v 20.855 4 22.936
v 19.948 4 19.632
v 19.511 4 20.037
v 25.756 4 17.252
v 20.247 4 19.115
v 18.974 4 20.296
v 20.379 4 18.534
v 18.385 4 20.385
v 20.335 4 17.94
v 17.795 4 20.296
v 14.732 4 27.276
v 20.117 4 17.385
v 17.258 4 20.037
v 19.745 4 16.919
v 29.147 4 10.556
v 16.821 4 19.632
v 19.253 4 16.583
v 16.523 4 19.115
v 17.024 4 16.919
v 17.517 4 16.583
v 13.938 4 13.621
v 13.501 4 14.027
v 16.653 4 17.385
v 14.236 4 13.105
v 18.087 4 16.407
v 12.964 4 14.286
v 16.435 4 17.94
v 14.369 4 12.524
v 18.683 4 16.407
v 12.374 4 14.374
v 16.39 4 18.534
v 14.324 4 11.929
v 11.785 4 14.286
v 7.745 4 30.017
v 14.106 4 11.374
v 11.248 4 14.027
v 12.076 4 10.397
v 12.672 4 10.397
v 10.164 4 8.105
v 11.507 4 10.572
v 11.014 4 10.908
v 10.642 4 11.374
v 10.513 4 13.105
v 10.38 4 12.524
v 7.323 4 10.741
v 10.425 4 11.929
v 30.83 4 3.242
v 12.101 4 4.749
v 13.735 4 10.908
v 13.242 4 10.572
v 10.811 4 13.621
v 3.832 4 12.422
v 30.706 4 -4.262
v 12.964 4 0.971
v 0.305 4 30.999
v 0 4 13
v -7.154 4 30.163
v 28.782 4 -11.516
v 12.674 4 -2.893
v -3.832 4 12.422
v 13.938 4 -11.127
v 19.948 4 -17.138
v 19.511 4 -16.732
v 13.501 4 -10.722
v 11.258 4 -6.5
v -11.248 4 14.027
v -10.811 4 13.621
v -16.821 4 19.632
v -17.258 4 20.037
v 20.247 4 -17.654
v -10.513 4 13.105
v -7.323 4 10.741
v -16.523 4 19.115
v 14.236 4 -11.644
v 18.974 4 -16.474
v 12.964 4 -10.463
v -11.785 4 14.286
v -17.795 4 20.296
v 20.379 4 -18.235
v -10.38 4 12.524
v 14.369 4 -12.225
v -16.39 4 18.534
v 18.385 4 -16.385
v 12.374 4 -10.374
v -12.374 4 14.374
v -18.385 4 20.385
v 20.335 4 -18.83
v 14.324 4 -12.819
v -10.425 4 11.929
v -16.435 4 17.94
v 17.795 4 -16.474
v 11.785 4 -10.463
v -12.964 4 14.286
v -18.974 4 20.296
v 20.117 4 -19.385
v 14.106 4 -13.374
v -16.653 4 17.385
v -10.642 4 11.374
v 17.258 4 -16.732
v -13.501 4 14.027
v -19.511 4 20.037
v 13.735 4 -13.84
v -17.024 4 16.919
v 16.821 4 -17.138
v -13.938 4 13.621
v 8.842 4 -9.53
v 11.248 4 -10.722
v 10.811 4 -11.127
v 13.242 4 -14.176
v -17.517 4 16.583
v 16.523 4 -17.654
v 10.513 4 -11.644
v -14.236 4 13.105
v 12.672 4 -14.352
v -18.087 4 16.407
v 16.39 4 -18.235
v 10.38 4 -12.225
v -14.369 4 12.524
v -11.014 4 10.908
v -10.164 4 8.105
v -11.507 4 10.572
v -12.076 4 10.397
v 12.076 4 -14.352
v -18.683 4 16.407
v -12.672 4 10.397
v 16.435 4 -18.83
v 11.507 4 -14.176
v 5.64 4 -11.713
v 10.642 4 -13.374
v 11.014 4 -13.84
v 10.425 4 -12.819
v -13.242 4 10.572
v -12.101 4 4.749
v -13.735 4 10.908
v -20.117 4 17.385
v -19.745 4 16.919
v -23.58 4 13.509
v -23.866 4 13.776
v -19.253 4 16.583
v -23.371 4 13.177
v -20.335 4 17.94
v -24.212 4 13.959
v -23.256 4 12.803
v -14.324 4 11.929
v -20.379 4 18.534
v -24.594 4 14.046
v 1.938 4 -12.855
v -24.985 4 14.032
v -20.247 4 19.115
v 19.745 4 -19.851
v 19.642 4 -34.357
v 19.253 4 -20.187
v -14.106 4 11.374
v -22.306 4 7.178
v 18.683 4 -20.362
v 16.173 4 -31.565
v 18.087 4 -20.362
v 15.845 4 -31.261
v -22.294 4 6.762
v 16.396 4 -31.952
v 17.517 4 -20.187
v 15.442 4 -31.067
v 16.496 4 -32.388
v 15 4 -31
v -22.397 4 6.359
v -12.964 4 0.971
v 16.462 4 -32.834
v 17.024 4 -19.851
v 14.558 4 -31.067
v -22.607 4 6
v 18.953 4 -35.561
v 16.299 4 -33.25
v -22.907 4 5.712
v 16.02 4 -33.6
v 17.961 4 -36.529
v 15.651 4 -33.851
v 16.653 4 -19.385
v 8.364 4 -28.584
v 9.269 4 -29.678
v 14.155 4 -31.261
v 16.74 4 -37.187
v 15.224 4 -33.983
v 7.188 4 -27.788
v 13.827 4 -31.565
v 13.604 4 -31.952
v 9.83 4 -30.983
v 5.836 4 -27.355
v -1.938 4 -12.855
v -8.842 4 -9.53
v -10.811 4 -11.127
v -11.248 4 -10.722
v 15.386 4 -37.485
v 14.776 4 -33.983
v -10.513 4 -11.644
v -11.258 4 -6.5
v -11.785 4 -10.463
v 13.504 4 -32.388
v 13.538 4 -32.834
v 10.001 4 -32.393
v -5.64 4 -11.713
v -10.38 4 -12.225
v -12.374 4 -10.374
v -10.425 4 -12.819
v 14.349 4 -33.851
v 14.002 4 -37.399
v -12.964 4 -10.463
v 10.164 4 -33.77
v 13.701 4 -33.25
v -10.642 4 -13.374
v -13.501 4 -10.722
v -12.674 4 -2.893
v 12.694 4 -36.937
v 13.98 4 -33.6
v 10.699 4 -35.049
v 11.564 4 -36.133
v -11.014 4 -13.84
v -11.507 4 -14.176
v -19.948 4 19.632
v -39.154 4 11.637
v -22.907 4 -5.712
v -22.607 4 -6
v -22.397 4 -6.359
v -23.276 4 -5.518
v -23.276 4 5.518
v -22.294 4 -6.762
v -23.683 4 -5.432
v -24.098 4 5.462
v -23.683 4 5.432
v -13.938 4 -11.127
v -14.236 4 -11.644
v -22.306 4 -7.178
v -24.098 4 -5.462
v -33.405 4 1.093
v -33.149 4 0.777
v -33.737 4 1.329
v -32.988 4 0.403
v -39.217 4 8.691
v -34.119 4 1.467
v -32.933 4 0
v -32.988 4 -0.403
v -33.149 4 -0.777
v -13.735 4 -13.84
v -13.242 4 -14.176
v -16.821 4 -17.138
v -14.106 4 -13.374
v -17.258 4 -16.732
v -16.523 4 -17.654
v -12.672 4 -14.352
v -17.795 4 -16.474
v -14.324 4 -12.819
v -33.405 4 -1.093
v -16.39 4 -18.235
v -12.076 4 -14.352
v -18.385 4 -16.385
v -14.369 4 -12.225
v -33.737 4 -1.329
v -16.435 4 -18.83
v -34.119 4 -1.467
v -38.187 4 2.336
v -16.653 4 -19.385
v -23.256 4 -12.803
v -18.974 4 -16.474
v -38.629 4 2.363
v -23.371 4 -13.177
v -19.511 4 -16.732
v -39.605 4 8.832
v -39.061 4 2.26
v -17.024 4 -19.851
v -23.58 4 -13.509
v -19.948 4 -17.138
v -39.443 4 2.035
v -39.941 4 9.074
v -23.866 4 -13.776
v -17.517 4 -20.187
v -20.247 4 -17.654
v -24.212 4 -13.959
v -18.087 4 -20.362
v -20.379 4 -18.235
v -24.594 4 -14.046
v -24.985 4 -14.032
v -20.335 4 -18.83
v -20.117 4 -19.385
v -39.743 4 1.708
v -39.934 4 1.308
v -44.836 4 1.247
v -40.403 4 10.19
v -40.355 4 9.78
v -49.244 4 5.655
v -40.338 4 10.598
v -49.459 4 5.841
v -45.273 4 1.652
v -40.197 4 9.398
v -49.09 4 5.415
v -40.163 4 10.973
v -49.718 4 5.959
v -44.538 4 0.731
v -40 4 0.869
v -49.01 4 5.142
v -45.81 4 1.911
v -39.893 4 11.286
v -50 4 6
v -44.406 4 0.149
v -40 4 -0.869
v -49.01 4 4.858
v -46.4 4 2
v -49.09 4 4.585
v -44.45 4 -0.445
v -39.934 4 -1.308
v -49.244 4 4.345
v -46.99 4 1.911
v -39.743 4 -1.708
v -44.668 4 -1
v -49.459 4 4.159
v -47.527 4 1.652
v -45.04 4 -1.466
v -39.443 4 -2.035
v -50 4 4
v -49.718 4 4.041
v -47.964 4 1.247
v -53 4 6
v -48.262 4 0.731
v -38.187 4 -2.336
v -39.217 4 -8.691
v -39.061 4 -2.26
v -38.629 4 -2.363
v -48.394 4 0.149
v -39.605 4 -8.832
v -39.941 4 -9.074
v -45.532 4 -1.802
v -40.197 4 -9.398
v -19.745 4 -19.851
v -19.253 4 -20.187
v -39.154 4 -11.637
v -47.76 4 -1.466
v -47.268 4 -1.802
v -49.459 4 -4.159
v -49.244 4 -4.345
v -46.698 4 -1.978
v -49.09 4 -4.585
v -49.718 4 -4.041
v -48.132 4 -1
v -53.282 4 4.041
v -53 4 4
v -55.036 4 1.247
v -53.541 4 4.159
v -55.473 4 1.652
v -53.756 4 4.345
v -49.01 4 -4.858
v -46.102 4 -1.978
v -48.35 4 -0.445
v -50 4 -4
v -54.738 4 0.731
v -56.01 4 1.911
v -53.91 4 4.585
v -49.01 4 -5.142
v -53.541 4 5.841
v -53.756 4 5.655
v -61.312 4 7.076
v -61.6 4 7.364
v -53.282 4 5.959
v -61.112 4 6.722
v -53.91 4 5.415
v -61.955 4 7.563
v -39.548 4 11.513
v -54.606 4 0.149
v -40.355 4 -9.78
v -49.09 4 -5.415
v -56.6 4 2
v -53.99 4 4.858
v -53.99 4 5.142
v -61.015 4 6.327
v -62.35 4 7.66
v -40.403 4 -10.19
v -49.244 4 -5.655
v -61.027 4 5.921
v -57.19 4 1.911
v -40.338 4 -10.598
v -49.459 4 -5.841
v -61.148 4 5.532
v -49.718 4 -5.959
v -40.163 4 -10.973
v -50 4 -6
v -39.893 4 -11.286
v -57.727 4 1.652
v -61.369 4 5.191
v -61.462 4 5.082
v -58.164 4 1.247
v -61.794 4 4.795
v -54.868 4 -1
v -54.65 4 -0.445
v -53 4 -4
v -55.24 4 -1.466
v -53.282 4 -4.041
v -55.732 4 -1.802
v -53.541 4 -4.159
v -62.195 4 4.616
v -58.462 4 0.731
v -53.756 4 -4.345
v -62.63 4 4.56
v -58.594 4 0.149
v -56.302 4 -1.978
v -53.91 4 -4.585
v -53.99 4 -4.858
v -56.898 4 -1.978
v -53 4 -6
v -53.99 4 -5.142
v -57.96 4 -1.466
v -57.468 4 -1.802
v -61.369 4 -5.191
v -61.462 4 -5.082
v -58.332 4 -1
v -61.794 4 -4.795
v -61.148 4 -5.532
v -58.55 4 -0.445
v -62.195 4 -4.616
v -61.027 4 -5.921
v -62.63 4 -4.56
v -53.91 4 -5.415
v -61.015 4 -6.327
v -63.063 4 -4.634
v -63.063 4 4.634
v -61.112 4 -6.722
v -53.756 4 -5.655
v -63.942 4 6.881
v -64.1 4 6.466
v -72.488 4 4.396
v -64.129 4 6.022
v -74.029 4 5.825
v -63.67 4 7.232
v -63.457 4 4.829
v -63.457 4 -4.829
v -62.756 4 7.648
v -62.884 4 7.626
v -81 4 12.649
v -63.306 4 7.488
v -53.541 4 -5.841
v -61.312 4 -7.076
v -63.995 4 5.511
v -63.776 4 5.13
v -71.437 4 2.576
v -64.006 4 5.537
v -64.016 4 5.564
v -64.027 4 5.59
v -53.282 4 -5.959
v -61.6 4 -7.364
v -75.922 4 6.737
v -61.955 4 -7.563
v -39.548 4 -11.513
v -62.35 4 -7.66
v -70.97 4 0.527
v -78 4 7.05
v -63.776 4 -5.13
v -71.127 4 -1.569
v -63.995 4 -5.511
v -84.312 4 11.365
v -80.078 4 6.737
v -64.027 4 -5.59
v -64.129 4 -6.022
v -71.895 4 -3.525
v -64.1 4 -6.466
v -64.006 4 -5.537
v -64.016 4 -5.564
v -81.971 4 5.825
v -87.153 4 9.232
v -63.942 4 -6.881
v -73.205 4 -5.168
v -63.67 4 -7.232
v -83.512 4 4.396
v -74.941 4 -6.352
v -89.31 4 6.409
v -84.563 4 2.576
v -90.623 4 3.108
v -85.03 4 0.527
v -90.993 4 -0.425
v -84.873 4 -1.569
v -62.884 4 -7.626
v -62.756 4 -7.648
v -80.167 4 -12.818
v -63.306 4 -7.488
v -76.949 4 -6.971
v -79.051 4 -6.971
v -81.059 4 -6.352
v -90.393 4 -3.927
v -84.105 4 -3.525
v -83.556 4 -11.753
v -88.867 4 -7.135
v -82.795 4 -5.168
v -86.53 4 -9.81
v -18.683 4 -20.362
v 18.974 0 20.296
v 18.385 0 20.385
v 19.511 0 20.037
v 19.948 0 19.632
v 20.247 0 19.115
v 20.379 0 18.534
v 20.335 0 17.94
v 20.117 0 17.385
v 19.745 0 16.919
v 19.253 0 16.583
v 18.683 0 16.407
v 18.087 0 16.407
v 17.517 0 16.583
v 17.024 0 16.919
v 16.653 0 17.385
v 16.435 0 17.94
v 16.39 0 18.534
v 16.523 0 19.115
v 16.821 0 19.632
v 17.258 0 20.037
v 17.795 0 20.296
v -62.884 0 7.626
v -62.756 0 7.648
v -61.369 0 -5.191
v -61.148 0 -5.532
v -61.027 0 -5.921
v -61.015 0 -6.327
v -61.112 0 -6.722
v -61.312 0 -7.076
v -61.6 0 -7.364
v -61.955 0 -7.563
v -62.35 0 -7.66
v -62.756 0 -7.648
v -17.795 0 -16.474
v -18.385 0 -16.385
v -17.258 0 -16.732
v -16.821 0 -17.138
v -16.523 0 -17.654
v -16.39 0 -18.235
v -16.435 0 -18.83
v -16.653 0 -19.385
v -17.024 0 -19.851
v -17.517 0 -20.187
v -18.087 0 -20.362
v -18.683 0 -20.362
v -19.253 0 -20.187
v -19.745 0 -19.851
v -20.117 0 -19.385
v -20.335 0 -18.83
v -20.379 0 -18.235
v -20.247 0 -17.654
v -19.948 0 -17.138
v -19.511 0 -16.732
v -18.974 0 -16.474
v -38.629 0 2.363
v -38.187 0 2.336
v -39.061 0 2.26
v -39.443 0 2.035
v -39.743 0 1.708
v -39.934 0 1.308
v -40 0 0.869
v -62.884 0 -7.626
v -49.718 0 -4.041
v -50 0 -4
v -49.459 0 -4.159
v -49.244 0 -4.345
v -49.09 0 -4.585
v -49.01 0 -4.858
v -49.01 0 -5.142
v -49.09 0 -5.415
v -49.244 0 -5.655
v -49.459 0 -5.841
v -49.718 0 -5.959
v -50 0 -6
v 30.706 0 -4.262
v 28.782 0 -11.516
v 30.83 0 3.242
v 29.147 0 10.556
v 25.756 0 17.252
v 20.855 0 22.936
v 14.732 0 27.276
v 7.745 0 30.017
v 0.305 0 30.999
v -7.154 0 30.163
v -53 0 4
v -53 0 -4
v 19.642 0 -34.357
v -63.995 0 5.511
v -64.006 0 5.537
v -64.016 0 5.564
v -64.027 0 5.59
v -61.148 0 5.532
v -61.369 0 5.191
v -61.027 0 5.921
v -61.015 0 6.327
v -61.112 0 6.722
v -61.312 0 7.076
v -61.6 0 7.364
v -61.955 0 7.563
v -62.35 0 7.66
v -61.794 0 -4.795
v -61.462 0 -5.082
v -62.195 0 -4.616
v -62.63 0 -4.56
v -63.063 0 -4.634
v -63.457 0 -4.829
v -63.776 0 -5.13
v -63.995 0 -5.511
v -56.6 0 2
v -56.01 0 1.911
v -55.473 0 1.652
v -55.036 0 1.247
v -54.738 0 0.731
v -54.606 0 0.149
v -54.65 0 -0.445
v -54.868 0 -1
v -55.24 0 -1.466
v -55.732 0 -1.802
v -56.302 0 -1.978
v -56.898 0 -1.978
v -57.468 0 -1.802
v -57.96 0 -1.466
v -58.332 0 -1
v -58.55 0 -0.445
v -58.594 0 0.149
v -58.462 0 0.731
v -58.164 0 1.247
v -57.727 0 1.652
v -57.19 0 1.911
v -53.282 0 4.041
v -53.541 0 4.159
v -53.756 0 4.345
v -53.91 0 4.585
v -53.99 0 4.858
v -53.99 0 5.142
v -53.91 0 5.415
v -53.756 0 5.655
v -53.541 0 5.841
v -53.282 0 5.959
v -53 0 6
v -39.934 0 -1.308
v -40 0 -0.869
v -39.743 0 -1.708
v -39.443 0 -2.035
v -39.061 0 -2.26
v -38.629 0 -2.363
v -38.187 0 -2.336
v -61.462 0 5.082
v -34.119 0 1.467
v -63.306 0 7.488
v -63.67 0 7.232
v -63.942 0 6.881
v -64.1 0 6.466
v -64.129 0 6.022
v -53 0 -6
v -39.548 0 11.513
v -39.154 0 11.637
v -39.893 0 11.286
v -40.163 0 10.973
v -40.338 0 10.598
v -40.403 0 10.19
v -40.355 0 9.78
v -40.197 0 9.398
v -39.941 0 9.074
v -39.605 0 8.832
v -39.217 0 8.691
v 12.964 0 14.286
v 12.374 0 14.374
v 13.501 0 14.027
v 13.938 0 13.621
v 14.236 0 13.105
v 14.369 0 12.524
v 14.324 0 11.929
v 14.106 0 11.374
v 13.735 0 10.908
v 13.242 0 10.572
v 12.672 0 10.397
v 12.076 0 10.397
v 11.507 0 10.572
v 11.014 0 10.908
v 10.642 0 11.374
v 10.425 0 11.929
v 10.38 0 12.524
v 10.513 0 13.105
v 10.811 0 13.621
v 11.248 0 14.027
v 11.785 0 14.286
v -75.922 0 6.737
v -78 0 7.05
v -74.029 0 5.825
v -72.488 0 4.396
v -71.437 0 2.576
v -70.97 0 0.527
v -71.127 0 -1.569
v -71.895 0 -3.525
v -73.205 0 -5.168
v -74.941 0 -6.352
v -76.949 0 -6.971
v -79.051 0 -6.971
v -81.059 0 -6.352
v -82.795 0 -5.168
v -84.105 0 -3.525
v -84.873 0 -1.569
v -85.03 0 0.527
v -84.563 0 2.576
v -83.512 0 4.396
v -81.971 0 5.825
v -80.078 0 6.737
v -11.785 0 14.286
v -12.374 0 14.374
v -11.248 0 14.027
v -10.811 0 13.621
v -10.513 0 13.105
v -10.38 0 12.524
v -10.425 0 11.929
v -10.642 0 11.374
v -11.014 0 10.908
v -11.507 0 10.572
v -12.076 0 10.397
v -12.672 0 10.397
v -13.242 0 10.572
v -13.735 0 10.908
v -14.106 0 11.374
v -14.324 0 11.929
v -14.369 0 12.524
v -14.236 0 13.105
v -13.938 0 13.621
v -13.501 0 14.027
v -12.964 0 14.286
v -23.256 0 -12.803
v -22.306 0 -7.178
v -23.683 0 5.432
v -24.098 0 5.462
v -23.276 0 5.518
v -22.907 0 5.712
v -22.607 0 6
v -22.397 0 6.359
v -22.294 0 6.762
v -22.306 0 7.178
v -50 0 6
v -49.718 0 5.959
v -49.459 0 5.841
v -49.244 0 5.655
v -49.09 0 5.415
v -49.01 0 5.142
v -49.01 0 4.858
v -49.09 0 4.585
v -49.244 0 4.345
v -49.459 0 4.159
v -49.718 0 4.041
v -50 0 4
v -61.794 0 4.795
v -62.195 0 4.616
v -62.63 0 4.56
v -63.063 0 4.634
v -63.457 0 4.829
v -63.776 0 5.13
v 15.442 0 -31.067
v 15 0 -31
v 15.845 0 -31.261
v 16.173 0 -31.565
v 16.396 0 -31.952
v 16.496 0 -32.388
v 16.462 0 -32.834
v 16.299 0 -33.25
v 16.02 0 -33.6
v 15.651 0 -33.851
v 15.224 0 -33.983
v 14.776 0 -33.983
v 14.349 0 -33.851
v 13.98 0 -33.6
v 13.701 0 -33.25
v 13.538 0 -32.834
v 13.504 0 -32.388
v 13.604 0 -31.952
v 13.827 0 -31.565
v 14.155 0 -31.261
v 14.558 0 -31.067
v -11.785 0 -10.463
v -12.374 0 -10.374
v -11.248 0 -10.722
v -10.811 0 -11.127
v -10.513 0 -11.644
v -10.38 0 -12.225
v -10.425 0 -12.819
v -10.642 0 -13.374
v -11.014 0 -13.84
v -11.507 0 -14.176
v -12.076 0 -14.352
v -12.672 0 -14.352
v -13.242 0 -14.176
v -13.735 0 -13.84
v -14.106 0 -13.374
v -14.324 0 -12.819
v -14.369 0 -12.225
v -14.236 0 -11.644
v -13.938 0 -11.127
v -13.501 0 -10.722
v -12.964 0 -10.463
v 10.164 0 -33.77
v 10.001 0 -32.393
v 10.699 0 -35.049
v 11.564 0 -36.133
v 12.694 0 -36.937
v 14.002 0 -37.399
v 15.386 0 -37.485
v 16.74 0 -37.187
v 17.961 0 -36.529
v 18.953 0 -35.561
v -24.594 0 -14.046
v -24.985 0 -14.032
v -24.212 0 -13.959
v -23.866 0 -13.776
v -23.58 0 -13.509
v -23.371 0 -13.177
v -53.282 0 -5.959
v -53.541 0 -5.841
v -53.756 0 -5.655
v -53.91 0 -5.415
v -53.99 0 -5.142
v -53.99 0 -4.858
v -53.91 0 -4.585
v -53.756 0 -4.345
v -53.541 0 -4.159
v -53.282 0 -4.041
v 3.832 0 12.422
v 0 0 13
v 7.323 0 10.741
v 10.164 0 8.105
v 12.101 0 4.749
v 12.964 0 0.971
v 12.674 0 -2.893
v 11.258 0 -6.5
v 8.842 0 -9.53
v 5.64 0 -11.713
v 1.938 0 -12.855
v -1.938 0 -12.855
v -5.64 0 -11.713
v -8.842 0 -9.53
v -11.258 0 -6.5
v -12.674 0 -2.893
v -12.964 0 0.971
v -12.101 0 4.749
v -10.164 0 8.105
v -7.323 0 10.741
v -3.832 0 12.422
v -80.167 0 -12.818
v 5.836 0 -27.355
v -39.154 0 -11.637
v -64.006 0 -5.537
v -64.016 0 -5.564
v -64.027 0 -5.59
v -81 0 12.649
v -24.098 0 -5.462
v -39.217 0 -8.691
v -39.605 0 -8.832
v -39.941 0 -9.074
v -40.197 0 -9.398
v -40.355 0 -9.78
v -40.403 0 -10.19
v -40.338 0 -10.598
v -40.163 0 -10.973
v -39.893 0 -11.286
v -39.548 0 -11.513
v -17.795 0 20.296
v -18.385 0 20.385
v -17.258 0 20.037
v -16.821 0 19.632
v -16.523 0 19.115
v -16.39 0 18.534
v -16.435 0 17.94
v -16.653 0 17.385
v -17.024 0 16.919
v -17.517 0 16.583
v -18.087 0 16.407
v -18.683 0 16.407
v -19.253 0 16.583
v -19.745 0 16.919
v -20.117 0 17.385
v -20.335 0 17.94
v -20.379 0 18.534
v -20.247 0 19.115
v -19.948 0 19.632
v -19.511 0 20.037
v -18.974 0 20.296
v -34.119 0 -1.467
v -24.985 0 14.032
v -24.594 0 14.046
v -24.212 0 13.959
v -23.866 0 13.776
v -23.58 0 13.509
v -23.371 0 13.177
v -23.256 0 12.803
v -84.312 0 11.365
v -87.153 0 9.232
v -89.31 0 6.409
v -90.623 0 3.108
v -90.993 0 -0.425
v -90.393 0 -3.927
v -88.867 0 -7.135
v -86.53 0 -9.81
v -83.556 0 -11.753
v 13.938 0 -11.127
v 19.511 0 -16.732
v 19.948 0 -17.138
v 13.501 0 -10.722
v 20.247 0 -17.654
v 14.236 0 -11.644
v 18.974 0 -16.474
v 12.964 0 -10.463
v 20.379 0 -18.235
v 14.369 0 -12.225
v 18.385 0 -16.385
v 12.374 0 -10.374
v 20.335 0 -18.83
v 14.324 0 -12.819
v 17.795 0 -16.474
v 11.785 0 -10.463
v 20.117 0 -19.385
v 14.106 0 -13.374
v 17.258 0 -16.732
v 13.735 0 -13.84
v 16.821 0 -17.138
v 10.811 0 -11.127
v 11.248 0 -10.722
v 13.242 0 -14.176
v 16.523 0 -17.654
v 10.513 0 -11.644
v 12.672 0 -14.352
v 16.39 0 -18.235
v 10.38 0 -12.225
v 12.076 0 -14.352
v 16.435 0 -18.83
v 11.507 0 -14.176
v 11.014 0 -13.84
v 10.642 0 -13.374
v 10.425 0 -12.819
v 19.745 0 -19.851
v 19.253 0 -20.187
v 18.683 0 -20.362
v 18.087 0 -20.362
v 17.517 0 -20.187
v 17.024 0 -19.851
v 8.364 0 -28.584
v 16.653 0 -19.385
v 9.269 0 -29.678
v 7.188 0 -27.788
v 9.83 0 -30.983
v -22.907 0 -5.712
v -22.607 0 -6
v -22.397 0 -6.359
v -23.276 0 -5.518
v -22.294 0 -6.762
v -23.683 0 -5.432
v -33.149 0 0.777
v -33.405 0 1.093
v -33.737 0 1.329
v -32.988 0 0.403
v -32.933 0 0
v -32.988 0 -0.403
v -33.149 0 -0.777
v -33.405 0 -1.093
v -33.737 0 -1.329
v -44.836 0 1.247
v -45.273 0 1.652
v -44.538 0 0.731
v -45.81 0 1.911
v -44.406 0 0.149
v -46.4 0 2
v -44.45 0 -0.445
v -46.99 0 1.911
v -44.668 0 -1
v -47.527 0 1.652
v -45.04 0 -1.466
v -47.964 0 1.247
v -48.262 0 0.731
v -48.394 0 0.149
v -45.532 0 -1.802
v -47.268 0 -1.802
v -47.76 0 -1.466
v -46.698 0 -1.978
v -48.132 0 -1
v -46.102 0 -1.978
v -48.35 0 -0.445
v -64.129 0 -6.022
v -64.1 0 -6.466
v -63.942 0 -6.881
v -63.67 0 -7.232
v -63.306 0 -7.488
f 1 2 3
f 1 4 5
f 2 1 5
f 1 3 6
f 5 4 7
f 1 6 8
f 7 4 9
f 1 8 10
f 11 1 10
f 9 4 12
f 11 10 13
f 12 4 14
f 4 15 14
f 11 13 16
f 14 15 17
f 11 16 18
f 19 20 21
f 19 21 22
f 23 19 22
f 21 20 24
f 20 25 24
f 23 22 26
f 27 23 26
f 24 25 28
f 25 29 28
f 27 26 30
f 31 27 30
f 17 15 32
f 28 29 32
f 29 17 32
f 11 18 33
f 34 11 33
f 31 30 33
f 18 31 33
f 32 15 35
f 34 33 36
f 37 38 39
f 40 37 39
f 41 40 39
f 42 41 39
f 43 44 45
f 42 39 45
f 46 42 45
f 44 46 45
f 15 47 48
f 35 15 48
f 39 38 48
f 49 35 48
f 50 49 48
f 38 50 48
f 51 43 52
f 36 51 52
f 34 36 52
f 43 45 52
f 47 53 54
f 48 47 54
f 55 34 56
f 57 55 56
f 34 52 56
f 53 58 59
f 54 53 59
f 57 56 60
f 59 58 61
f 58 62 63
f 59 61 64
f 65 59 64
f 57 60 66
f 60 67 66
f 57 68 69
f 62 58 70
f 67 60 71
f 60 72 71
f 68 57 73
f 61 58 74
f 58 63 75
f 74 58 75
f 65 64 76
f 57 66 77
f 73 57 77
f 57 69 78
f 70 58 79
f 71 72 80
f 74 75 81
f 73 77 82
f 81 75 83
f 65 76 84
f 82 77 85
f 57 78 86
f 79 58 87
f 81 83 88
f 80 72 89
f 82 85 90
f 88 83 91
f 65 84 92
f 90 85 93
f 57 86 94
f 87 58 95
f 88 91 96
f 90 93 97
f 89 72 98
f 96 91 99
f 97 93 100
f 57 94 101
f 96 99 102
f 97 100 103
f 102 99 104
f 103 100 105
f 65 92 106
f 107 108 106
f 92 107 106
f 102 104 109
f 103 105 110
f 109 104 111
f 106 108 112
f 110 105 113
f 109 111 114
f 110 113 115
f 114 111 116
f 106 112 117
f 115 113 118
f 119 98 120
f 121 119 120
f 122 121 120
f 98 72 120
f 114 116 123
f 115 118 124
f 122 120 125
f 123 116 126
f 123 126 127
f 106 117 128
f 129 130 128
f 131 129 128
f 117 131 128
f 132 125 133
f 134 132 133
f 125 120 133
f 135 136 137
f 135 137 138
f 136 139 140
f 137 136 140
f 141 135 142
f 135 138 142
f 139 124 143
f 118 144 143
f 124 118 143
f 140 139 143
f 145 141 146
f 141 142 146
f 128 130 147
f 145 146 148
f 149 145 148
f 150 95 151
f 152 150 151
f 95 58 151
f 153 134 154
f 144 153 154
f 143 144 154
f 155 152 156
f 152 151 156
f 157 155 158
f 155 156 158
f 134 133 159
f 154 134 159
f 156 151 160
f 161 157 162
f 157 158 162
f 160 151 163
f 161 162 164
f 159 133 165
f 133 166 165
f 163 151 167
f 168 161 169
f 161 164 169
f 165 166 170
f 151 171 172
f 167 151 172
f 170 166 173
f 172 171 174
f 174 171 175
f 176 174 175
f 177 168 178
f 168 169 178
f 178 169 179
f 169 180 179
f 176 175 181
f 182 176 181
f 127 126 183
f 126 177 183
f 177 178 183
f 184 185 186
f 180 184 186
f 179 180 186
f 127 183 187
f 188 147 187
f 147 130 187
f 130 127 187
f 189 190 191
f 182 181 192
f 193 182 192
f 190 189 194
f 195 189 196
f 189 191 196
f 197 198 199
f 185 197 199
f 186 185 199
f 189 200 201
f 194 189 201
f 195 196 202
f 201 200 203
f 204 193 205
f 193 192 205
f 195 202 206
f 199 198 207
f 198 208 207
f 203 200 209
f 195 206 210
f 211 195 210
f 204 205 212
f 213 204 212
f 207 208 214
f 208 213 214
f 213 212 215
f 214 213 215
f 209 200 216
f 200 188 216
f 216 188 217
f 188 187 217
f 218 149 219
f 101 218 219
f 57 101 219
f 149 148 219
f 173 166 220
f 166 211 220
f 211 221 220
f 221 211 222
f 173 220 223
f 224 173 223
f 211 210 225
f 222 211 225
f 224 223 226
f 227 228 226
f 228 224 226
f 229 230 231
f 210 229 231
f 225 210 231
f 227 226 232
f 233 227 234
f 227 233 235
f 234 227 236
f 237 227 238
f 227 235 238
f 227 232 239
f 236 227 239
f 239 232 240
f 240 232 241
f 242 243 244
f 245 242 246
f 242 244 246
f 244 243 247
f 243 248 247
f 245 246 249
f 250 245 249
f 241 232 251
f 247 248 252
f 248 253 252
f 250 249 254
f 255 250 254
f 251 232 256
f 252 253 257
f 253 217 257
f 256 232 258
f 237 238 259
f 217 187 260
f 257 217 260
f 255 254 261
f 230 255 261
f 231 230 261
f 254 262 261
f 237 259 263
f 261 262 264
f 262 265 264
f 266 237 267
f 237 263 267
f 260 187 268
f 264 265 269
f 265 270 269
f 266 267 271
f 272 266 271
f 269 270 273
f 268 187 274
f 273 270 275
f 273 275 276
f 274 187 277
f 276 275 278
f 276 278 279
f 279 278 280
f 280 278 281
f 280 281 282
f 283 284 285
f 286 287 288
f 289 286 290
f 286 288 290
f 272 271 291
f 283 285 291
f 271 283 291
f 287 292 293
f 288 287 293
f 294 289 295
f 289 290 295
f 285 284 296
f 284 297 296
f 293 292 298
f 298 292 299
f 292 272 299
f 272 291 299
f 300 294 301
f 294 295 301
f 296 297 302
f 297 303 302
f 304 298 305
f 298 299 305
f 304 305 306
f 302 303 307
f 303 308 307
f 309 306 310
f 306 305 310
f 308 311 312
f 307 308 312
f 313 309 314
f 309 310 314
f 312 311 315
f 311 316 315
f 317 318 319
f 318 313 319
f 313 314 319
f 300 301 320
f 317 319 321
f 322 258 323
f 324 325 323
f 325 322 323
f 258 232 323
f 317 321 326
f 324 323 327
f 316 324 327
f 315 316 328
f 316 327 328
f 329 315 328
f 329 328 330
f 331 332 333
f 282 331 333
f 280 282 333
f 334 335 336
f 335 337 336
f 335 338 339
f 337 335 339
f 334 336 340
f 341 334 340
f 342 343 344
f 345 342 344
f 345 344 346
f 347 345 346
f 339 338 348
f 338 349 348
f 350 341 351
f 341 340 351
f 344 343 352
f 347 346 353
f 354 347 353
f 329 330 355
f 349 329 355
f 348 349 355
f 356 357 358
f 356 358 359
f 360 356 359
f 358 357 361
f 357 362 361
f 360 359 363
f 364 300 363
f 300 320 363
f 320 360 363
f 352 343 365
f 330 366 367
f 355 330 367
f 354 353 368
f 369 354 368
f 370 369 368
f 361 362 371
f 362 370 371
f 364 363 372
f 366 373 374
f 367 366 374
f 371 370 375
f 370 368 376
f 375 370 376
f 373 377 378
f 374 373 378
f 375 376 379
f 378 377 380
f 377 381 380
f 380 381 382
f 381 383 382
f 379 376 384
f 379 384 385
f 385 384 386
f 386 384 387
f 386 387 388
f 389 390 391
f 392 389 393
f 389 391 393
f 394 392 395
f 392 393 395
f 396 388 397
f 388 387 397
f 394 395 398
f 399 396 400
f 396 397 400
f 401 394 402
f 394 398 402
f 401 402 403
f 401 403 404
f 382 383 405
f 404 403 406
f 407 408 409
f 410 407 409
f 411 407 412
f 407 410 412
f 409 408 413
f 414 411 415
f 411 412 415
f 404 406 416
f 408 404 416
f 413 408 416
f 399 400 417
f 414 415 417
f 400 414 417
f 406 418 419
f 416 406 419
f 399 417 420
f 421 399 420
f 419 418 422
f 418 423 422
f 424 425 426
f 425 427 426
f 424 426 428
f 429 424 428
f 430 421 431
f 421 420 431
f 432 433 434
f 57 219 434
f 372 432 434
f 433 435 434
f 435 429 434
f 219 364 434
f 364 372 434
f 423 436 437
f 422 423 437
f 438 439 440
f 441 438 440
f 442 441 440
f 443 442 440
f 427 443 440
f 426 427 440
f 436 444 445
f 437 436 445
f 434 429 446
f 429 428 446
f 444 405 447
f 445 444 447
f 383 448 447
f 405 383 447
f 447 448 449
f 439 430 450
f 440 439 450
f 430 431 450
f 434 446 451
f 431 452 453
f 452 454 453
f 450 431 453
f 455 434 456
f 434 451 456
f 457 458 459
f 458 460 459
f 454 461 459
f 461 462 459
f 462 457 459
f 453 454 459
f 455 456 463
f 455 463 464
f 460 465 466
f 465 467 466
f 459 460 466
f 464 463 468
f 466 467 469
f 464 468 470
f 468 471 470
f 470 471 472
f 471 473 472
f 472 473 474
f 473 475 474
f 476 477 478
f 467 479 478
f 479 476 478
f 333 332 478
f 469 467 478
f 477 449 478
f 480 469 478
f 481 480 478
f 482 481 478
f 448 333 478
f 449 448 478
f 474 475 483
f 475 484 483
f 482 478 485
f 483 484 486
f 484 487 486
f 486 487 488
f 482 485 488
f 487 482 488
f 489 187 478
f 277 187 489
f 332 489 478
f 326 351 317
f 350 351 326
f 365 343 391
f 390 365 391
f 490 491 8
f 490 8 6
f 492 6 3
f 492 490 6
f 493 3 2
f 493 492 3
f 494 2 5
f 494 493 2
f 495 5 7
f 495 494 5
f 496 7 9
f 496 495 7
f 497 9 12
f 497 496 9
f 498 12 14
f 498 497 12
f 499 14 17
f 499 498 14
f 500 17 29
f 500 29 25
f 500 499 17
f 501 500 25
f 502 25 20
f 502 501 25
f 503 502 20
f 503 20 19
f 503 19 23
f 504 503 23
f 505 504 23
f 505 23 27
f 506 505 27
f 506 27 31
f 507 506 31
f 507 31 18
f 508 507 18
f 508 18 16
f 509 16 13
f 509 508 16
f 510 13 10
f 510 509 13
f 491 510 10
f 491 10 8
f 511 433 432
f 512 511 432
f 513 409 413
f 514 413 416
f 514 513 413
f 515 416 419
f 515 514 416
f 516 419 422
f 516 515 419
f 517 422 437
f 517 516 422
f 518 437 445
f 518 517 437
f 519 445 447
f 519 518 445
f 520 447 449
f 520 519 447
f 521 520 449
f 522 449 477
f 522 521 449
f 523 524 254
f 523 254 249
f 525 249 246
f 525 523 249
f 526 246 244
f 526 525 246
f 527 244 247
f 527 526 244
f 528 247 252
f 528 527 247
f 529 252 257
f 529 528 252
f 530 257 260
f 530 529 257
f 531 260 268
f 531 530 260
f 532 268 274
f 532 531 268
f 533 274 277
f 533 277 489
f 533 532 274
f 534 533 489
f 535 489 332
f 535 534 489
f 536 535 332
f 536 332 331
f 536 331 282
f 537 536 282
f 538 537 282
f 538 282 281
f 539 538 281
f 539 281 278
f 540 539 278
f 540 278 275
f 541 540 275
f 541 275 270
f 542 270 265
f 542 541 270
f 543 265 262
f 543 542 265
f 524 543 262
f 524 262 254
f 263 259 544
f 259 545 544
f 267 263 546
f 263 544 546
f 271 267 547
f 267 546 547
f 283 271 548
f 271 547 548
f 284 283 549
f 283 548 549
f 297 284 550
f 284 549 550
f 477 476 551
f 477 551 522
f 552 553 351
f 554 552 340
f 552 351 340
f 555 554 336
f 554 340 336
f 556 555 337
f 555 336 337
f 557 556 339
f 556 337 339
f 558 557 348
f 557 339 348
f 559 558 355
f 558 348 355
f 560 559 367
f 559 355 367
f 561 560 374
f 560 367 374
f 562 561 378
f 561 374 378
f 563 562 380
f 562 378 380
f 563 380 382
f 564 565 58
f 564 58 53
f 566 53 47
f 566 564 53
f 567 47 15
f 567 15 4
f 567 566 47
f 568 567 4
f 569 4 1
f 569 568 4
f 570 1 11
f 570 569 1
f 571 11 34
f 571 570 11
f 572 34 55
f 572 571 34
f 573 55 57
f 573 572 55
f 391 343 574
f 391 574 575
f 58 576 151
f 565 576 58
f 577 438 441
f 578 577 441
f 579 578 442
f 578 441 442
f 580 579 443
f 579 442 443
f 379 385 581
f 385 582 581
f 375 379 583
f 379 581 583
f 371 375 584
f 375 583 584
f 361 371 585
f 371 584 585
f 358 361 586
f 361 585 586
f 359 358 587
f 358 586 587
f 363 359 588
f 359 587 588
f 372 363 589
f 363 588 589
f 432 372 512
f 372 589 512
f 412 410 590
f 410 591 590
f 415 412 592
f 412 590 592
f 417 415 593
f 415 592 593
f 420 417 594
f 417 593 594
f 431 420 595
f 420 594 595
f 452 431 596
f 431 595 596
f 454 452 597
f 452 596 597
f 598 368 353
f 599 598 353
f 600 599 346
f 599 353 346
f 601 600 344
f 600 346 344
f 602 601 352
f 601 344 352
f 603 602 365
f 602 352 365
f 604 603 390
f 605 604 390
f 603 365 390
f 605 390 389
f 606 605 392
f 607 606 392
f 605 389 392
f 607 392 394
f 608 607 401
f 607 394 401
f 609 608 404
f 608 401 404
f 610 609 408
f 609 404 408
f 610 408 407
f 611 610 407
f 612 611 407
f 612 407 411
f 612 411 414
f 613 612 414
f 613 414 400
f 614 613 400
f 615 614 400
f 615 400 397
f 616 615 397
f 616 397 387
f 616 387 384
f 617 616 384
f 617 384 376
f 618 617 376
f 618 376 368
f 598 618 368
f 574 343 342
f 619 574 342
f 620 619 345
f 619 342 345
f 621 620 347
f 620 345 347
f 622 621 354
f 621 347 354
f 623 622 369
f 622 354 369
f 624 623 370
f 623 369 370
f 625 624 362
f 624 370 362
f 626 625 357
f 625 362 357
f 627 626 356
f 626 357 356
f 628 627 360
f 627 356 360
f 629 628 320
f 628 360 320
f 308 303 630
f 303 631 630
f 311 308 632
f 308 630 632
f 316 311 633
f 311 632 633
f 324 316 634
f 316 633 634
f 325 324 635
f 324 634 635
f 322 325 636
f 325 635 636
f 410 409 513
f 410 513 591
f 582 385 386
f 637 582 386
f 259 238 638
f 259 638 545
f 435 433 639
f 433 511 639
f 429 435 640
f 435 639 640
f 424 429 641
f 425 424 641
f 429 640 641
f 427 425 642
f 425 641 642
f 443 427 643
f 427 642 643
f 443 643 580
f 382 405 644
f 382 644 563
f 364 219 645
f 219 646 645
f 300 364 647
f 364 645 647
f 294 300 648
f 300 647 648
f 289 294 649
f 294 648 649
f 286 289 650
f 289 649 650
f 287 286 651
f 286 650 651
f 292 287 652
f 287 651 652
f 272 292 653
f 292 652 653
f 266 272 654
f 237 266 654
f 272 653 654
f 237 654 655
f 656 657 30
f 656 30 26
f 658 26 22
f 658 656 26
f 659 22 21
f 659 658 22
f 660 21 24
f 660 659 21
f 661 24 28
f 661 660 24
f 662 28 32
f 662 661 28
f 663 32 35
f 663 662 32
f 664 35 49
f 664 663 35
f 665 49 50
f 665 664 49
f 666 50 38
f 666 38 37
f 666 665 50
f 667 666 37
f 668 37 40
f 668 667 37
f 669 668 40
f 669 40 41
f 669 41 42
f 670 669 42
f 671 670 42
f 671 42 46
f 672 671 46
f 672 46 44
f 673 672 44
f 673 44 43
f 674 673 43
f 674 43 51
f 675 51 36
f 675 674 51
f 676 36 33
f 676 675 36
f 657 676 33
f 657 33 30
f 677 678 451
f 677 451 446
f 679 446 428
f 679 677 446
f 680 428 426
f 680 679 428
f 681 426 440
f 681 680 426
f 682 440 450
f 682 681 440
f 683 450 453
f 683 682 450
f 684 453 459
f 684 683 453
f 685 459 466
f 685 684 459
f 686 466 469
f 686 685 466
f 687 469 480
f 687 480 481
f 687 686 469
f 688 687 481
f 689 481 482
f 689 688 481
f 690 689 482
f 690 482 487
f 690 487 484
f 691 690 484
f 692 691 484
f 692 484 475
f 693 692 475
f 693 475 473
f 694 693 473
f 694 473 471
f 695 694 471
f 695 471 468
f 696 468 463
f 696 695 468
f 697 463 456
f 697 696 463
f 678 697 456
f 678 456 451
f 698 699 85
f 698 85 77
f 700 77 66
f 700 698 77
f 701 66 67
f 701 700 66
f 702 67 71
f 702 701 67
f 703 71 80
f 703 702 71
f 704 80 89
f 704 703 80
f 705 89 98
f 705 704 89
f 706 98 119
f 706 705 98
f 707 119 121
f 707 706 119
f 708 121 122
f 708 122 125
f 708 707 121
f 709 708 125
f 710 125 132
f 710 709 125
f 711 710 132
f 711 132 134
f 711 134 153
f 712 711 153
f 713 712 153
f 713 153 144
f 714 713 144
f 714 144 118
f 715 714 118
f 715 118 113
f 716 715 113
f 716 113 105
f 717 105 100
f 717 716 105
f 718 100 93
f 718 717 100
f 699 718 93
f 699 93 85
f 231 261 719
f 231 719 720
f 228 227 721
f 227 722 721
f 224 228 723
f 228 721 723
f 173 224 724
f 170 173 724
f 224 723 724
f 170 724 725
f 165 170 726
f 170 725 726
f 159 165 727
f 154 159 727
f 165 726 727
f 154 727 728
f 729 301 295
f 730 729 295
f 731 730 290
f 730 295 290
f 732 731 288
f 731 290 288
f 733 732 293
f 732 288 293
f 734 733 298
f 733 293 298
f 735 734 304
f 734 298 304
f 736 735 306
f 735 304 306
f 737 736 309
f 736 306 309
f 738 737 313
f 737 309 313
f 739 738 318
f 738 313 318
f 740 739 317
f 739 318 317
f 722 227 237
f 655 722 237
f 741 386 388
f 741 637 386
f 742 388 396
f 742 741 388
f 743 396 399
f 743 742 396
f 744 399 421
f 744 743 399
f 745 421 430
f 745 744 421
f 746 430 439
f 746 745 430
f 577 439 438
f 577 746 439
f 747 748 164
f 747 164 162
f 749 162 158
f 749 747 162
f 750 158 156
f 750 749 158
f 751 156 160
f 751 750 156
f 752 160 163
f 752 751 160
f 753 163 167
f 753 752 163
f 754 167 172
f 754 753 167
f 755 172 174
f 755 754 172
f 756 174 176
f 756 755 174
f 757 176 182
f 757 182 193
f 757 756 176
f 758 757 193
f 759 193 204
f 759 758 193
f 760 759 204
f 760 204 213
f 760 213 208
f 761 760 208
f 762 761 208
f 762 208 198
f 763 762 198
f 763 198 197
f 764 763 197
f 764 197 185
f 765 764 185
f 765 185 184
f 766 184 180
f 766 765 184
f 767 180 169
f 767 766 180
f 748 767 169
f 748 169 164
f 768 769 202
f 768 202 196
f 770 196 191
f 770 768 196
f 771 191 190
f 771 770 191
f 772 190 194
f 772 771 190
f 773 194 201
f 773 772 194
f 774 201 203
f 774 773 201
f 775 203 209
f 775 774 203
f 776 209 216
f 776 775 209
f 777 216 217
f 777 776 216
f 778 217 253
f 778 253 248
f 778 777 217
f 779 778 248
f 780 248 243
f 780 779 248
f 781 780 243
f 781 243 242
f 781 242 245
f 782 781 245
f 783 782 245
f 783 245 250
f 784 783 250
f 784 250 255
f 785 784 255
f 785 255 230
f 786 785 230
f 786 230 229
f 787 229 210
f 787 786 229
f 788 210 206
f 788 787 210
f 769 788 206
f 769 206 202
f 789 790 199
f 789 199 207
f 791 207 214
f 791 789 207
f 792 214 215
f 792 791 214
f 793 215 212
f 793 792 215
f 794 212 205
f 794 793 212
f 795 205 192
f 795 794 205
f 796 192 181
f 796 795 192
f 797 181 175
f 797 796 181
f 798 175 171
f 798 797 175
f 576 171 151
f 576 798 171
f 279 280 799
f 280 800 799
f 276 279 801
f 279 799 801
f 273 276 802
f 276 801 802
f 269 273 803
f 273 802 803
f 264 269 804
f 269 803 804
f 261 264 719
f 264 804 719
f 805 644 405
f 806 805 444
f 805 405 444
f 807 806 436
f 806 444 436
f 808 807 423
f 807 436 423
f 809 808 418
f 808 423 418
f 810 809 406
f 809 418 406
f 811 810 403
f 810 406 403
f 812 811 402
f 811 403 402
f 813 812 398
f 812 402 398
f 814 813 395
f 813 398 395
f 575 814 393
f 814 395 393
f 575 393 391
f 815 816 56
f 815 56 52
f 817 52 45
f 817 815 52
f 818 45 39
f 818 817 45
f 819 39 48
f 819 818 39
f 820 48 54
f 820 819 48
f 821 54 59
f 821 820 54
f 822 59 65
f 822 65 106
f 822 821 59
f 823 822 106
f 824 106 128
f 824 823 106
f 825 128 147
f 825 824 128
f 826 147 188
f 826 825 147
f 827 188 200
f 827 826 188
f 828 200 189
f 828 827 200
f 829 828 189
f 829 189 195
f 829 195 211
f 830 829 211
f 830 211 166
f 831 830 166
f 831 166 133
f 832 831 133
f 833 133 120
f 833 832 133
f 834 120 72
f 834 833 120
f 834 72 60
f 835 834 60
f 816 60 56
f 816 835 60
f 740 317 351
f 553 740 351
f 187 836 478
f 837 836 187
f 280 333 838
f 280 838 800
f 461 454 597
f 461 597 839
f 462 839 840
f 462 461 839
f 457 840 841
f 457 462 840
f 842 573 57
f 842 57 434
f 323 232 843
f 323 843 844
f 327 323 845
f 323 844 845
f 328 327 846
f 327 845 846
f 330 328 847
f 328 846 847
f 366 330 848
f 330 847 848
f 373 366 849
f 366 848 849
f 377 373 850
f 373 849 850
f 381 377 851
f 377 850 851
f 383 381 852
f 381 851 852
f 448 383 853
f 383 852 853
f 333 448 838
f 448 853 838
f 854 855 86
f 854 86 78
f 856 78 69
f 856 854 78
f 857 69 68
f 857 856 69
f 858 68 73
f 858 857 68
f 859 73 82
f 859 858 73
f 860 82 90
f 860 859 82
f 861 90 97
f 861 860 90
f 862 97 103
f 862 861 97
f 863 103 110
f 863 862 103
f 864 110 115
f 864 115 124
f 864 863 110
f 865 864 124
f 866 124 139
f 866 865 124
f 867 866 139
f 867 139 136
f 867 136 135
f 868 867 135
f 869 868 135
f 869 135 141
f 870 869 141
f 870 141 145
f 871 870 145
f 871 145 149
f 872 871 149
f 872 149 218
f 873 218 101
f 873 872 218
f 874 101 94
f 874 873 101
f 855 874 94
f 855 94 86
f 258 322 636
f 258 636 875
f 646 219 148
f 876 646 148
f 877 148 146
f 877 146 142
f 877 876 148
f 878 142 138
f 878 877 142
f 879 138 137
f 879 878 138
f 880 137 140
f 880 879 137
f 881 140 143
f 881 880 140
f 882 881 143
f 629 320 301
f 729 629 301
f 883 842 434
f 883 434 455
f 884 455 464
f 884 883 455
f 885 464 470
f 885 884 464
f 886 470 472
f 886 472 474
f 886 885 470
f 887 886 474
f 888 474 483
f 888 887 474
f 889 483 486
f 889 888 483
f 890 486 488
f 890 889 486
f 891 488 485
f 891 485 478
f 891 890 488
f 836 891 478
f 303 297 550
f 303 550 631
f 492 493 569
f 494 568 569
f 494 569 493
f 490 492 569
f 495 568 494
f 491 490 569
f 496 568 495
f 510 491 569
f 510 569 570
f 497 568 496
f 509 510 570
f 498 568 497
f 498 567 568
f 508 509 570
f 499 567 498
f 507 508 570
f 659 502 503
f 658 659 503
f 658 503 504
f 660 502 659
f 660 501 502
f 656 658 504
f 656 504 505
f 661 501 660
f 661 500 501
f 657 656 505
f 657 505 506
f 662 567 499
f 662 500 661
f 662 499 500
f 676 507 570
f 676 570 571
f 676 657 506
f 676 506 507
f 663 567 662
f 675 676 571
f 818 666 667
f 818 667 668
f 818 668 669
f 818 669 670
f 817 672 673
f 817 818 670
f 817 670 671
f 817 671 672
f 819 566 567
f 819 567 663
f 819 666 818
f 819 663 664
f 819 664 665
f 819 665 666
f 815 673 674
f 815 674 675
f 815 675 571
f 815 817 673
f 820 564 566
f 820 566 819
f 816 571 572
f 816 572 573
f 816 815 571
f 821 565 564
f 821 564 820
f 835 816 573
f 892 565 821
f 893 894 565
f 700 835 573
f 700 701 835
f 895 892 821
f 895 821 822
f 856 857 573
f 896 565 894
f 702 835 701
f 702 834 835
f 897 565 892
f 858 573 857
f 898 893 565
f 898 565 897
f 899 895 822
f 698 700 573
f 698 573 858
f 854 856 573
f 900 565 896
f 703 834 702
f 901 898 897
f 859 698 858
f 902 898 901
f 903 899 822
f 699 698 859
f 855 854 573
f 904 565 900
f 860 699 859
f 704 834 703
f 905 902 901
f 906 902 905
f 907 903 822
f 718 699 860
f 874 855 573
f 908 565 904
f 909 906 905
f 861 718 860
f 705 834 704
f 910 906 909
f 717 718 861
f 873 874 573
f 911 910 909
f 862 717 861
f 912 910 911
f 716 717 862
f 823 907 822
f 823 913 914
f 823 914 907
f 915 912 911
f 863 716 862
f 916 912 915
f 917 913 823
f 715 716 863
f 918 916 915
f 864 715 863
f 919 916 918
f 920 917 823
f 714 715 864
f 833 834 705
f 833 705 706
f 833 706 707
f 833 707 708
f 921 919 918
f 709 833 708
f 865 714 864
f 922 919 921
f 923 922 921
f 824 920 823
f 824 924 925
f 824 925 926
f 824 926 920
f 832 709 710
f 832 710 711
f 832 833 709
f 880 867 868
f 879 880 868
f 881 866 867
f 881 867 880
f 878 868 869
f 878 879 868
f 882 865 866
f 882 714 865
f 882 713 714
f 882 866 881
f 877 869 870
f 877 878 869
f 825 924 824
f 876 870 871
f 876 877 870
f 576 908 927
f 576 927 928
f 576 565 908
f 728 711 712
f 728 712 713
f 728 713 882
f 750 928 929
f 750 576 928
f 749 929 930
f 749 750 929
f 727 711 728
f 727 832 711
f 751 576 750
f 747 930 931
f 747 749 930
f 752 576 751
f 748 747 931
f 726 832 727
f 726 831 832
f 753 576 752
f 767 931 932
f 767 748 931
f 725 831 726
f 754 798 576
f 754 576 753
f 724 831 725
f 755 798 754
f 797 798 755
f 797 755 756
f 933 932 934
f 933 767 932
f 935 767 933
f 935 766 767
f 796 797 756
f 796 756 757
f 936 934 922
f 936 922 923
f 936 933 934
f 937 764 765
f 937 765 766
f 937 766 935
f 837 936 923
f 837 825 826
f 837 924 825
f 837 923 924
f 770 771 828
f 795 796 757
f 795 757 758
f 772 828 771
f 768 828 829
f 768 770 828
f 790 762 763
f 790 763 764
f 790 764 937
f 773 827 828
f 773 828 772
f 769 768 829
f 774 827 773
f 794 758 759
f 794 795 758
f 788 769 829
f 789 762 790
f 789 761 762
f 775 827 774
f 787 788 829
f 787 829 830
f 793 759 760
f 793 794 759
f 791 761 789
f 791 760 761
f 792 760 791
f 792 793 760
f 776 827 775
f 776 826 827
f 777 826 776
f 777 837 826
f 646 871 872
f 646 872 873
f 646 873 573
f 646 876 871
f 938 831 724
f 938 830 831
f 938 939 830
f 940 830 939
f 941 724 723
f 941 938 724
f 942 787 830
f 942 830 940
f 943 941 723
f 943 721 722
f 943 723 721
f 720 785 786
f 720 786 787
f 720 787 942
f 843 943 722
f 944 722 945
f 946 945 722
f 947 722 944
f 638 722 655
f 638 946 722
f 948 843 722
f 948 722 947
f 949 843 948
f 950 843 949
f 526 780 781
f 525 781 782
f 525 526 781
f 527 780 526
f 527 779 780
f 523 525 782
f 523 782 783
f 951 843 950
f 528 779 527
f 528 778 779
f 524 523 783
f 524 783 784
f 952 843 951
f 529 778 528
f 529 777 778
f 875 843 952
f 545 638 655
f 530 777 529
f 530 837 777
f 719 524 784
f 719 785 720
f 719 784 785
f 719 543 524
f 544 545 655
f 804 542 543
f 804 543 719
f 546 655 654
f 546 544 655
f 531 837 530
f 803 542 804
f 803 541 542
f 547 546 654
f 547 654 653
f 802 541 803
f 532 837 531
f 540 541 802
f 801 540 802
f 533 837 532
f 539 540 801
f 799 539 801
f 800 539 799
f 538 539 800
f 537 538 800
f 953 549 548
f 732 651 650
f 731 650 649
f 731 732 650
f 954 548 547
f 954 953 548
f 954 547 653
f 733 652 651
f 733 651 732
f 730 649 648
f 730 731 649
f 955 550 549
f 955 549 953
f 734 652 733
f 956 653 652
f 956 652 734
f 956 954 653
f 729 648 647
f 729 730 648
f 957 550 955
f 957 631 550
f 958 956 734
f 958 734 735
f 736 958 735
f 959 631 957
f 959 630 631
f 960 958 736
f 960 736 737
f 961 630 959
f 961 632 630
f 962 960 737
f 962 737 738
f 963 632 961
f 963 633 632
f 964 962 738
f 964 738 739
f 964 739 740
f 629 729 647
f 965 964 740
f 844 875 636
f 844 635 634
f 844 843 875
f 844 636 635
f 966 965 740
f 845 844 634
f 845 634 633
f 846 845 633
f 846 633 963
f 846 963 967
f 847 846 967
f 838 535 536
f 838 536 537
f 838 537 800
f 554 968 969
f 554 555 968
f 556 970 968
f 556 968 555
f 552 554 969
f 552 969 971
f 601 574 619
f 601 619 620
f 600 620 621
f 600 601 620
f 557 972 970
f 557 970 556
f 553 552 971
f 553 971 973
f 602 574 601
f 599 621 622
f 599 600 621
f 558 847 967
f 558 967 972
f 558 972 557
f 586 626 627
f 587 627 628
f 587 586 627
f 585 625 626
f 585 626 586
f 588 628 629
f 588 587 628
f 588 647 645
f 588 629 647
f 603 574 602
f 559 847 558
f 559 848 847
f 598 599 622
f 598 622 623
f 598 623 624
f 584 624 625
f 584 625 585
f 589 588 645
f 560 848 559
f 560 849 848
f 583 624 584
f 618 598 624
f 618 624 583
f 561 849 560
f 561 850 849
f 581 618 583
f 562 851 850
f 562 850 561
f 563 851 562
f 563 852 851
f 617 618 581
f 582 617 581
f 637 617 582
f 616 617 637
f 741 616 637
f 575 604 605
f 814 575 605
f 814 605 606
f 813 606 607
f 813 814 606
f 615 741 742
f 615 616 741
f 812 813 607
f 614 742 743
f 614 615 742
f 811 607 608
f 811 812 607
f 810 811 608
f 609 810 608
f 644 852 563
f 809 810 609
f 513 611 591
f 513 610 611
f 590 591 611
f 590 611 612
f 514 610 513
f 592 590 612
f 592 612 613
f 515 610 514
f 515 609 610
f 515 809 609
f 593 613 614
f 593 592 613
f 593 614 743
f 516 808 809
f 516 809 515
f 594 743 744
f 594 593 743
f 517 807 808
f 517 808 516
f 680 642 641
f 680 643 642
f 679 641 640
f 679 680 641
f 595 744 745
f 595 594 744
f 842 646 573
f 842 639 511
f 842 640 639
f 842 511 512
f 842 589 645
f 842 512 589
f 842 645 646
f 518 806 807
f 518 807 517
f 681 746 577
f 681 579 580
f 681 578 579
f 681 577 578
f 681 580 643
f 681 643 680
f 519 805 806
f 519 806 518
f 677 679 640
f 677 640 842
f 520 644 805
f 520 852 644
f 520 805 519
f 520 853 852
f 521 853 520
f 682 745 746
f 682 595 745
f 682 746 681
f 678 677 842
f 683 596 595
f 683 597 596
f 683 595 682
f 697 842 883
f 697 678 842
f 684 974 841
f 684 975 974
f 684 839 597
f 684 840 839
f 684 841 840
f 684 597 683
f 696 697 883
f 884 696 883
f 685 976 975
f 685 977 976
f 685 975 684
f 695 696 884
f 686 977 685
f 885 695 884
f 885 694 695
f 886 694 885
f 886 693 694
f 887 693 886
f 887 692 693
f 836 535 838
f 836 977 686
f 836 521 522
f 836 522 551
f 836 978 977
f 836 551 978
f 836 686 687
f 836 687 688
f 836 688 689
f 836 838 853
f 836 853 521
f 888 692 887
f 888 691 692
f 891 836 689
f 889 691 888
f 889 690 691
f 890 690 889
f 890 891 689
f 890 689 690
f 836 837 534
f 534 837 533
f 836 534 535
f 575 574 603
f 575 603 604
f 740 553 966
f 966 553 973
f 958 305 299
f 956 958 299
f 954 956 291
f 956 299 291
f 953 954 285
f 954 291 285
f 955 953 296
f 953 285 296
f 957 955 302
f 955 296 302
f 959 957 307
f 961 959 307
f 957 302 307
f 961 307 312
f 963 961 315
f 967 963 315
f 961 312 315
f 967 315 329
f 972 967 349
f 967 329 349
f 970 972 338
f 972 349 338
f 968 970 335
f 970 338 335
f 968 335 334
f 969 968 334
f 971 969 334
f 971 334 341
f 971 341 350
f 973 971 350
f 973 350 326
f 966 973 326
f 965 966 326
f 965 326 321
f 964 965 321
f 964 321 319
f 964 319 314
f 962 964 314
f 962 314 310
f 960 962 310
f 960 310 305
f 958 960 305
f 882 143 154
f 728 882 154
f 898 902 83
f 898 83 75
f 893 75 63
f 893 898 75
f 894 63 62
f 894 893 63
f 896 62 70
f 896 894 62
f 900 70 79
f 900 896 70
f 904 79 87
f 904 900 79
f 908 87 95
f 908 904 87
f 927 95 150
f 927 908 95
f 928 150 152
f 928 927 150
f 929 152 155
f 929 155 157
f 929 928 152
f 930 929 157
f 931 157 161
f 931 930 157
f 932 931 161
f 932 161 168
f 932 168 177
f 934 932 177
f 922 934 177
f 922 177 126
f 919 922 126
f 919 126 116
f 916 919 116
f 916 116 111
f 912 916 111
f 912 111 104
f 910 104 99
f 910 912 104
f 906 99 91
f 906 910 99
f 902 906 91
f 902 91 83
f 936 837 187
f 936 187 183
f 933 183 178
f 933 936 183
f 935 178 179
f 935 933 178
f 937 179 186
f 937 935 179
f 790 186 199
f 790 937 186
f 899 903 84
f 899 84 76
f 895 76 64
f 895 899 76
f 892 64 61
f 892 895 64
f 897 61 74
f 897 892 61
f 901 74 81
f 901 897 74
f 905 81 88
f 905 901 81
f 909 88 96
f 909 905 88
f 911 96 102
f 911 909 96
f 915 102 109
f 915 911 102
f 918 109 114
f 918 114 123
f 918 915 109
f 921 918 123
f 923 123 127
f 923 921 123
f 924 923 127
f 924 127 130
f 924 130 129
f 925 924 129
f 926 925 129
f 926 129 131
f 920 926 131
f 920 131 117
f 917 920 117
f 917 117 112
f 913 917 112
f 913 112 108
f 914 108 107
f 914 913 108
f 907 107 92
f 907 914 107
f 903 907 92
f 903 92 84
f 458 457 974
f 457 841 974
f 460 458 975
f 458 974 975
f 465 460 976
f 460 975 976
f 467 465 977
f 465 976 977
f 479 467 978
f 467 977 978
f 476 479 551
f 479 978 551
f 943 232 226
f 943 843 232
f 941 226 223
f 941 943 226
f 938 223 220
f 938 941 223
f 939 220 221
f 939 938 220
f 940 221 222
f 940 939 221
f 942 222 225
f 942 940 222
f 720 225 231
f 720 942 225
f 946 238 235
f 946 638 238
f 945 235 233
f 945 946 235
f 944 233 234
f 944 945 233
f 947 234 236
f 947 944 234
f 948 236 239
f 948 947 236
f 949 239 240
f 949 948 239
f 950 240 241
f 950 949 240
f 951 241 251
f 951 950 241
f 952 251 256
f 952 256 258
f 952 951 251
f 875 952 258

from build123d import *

# Parameters (mm, degrees)
SKETCH_1_R          = 7.05
SKETCH_1_R_2        = 1.5
SKETCH_1_R_3        = 2
SKETCH_1_R_4        = 13
EXTRUDE_1_DEPTH     = 4
SKETCH_4_R          = 2
SKETCH_4_W          = 3
SKETCH_4_H          = 12
CUT_EXTRUDE_7_DEPTH = 99.505076011
SKETCH_8_R          = 1
CUT_EXTRUDE_6_DEPTH = 99.505076011
CUT_EXTRUDE_8_DEPTH = 99.505076011
FILLET_1_R          = 1.5


with BuildPart() as part:
    # 草图1 → 凸台-拉伸1 (new body)
    with BuildSketch(Plane(origin=(0, 0, 0), x_dir=(1, 0, 0), z_dir=(0, 1, 0))):
        with BuildLine():
            Line((-80.166666667, 12.818172863), (5.835638785, 27.355215737))
            ThreePointArc((5.835638785, 27.355215737), (8.855550352, 29.098982843), (10.001152726, 32.392641112))
            ThreePointArc((10.001152726, 32.392641112), (14.001538866, 37.399293353), (19.642183216, 34.3574539))
            Line((19.642183216, 34.3574539), (28.781535937, 11.516214183))
            ThreePointArc((28.781535937, 11.516214183), (23.478372246, -20.242678595), (-7.153846154, -30.163263835))
            Line((-7.153846154, -30.163263835), (-81, -12.649110641))
            ThreePointArc((-81, -12.649110641), (-90.993045962, 0.425154819), (-80.166666667, 12.818172863))
        make_face()
        with Locations(Location((-78, 0, 0), (0, 0, 270))):
            Circle(SKETCH_1_R, mode=Mode.SUBTRACT)
        with Locations(Location((15, 32.5, 0), (0, 0, 270))):
            Circle(SKETCH_1_R_2, mode=Mode.SUBTRACT)
        with Locations(Location((-18.384776311, 18.384776311, 0), (0, 0, 270))):
            Circle(SKETCH_1_R_3, mode=Mode.SUBTRACT)
        with Locations(Location((18.384776311, 18.384776311, 0), (0, 0, 270))):
            Circle(SKETCH_1_R_3, mode=Mode.SUBTRACT)
        with Locations(Location((18.384776311, -18.384776311, 0), (0, 0, 270))):
            Circle(SKETCH_1_R_3, mode=Mode.SUBTRACT)
        with Locations(Location((-18.384776311, -18.384776311, 0), (0, 0, 270))):
            Circle(SKETCH_1_R_3, mode=Mode.SUBTRACT)
        with Locations(Location((-12.374368671, 12.374368671, 0), (0, 0, 270))):
            Circle(SKETCH_1_R_3, mode=Mode.SUBTRACT)
        with Locations(Location((12.374368671, 12.374368671, 0), (0, 0, 270))):
            Circle(SKETCH_1_R_3, mode=Mode.SUBTRACT)
        with Locations(Location((12.374368671, -12.374368671, 0), (0, 0, 270))):
            Circle(SKETCH_1_R_3, mode=Mode.SUBTRACT)
        with Locations(Location((-12.374368671, -12.374368671, 0), (0, 0, 270))):
            Circle(SKETCH_1_R_3, mode=Mode.SUBTRACT)
        with Locations(Location((0, 0, 0), (0, 0, 270))):
            Circle(SKETCH_1_R_4, mode=Mode.SUBTRACT)
    extrude(amount=EXTRUDE_1_DEPTH)

    # 草图4 → 切除-拉伸7 (cut, through all)
    with BuildSketch(Plane(origin=(0, 4, 0), x_dir=(1, 0, 0), z_dir=(0, 1, 0))):
        with Locations(Location((-56.6, 0, 0), (0, 0, 270))):
            Circle(SKETCH_4_R)
        with Locations(Location((-46.4, 0, 0), (0, 0, 270))):
            Circle(SKETCH_4_R)
        with Locations((-51.5, 0)):
            Rectangle(SKETCH_4_W, SKETCH_4_H)
    extrude(amount=-CUT_EXTRUDE_7_DEPTH, mode=Mode.SUBTRACT)

    # 草图8 → 切除-拉伸6 (cut, through all)
    with BuildSketch(Plane(origin=(0, 4, 0), x_dir=(1, 0, 0), z_dir=(0, 1, 0))):
        with Locations((-53, 5)):
            Circle(SKETCH_8_R)
        with Locations((-53, -5)):
            Circle(SKETCH_8_R)
        with Locations((-50, -5)):
            Circle(SKETCH_8_R)
        with Locations((-50, 5)):
            Circle(SKETCH_8_R)
    extrude(amount=-CUT_EXTRUDE_6_DEPTH, mode=Mode.SUBTRACT)

    # 草图9 → 切除-拉伸8 (cut, through all)
    with BuildSketch(Plane(origin=(0, 4, 0), x_dir=(1, 0, 0), z_dir=(0, 1, 0))):
        Polygon((-23.506360694, 14.282031751), (-21.937410968, 5), (-46.887877974, 10.329833989), align=None)
        Polygon((-46.887877974, -10.329833989), (-23.506360694, -14.282031751), (-21.937410968, -5), align=None)
        with BuildLine():
            Line((-64.836719159, 7.29592609), (-58.661742218, 8.339687697))
            Line((-58.661742218, 8.339687697), (-63.252034039, 3))
            ThreePointArc((-63.252034039, 3), (-63.880043564, 5.208582364), (-64.836719159, 7.29592609))
        make_face()
        with BuildLine():
            Line((-58.661742218, -8.339687697), (-63.252034039, -3))
            ThreePointArc((-63.252034039, -3), (-63.880043564, -5.208582364), (-64.836719159, -7.29592609))
            Line((-64.836719159, -7.29592609), (-58.661742218, -8.339687697))
        make_face()
        Polygon((-40, 2.723099806), (-27.252396227, 0), (-40, -2.723099806), align=None)
    extrude(amount=-CUT_EXTRUDE_8_DEPTH, mode=Mode.SUBTRACT)

    # 圆角1
    fillet_1_edges = [part.edges().sort_by_distance(p)[0] for p in [
        (-46.887877974, 2, 10.329833989),
        (-21.937410968, 2, 5),
        (-23.506360694, 2, 14.282031751),
        (-63.252034039, 2, -3),
        (-64.836719159, 2, -7.29592609),
        (-58.661742218, 2, -8.339687697),
        (-40, 2, 2.723099806),
        (-40, 2, -2.723099806),
        (-27.252396227, 2, 0),
        (-64.836719159, 2, 7.29592609),
        (-63.252034039, 2, 3),
        (-58.661742218, 2, 8.339687697),
        (-46.887877974, 2, -10.329833989),
        (-23.506360694, 2, -14.282031751),
        (-21.937410968, 2, -5),
    ]]
    fillet(fillet_1_edges, radius=FILLET_1_R)


solid = part.part
